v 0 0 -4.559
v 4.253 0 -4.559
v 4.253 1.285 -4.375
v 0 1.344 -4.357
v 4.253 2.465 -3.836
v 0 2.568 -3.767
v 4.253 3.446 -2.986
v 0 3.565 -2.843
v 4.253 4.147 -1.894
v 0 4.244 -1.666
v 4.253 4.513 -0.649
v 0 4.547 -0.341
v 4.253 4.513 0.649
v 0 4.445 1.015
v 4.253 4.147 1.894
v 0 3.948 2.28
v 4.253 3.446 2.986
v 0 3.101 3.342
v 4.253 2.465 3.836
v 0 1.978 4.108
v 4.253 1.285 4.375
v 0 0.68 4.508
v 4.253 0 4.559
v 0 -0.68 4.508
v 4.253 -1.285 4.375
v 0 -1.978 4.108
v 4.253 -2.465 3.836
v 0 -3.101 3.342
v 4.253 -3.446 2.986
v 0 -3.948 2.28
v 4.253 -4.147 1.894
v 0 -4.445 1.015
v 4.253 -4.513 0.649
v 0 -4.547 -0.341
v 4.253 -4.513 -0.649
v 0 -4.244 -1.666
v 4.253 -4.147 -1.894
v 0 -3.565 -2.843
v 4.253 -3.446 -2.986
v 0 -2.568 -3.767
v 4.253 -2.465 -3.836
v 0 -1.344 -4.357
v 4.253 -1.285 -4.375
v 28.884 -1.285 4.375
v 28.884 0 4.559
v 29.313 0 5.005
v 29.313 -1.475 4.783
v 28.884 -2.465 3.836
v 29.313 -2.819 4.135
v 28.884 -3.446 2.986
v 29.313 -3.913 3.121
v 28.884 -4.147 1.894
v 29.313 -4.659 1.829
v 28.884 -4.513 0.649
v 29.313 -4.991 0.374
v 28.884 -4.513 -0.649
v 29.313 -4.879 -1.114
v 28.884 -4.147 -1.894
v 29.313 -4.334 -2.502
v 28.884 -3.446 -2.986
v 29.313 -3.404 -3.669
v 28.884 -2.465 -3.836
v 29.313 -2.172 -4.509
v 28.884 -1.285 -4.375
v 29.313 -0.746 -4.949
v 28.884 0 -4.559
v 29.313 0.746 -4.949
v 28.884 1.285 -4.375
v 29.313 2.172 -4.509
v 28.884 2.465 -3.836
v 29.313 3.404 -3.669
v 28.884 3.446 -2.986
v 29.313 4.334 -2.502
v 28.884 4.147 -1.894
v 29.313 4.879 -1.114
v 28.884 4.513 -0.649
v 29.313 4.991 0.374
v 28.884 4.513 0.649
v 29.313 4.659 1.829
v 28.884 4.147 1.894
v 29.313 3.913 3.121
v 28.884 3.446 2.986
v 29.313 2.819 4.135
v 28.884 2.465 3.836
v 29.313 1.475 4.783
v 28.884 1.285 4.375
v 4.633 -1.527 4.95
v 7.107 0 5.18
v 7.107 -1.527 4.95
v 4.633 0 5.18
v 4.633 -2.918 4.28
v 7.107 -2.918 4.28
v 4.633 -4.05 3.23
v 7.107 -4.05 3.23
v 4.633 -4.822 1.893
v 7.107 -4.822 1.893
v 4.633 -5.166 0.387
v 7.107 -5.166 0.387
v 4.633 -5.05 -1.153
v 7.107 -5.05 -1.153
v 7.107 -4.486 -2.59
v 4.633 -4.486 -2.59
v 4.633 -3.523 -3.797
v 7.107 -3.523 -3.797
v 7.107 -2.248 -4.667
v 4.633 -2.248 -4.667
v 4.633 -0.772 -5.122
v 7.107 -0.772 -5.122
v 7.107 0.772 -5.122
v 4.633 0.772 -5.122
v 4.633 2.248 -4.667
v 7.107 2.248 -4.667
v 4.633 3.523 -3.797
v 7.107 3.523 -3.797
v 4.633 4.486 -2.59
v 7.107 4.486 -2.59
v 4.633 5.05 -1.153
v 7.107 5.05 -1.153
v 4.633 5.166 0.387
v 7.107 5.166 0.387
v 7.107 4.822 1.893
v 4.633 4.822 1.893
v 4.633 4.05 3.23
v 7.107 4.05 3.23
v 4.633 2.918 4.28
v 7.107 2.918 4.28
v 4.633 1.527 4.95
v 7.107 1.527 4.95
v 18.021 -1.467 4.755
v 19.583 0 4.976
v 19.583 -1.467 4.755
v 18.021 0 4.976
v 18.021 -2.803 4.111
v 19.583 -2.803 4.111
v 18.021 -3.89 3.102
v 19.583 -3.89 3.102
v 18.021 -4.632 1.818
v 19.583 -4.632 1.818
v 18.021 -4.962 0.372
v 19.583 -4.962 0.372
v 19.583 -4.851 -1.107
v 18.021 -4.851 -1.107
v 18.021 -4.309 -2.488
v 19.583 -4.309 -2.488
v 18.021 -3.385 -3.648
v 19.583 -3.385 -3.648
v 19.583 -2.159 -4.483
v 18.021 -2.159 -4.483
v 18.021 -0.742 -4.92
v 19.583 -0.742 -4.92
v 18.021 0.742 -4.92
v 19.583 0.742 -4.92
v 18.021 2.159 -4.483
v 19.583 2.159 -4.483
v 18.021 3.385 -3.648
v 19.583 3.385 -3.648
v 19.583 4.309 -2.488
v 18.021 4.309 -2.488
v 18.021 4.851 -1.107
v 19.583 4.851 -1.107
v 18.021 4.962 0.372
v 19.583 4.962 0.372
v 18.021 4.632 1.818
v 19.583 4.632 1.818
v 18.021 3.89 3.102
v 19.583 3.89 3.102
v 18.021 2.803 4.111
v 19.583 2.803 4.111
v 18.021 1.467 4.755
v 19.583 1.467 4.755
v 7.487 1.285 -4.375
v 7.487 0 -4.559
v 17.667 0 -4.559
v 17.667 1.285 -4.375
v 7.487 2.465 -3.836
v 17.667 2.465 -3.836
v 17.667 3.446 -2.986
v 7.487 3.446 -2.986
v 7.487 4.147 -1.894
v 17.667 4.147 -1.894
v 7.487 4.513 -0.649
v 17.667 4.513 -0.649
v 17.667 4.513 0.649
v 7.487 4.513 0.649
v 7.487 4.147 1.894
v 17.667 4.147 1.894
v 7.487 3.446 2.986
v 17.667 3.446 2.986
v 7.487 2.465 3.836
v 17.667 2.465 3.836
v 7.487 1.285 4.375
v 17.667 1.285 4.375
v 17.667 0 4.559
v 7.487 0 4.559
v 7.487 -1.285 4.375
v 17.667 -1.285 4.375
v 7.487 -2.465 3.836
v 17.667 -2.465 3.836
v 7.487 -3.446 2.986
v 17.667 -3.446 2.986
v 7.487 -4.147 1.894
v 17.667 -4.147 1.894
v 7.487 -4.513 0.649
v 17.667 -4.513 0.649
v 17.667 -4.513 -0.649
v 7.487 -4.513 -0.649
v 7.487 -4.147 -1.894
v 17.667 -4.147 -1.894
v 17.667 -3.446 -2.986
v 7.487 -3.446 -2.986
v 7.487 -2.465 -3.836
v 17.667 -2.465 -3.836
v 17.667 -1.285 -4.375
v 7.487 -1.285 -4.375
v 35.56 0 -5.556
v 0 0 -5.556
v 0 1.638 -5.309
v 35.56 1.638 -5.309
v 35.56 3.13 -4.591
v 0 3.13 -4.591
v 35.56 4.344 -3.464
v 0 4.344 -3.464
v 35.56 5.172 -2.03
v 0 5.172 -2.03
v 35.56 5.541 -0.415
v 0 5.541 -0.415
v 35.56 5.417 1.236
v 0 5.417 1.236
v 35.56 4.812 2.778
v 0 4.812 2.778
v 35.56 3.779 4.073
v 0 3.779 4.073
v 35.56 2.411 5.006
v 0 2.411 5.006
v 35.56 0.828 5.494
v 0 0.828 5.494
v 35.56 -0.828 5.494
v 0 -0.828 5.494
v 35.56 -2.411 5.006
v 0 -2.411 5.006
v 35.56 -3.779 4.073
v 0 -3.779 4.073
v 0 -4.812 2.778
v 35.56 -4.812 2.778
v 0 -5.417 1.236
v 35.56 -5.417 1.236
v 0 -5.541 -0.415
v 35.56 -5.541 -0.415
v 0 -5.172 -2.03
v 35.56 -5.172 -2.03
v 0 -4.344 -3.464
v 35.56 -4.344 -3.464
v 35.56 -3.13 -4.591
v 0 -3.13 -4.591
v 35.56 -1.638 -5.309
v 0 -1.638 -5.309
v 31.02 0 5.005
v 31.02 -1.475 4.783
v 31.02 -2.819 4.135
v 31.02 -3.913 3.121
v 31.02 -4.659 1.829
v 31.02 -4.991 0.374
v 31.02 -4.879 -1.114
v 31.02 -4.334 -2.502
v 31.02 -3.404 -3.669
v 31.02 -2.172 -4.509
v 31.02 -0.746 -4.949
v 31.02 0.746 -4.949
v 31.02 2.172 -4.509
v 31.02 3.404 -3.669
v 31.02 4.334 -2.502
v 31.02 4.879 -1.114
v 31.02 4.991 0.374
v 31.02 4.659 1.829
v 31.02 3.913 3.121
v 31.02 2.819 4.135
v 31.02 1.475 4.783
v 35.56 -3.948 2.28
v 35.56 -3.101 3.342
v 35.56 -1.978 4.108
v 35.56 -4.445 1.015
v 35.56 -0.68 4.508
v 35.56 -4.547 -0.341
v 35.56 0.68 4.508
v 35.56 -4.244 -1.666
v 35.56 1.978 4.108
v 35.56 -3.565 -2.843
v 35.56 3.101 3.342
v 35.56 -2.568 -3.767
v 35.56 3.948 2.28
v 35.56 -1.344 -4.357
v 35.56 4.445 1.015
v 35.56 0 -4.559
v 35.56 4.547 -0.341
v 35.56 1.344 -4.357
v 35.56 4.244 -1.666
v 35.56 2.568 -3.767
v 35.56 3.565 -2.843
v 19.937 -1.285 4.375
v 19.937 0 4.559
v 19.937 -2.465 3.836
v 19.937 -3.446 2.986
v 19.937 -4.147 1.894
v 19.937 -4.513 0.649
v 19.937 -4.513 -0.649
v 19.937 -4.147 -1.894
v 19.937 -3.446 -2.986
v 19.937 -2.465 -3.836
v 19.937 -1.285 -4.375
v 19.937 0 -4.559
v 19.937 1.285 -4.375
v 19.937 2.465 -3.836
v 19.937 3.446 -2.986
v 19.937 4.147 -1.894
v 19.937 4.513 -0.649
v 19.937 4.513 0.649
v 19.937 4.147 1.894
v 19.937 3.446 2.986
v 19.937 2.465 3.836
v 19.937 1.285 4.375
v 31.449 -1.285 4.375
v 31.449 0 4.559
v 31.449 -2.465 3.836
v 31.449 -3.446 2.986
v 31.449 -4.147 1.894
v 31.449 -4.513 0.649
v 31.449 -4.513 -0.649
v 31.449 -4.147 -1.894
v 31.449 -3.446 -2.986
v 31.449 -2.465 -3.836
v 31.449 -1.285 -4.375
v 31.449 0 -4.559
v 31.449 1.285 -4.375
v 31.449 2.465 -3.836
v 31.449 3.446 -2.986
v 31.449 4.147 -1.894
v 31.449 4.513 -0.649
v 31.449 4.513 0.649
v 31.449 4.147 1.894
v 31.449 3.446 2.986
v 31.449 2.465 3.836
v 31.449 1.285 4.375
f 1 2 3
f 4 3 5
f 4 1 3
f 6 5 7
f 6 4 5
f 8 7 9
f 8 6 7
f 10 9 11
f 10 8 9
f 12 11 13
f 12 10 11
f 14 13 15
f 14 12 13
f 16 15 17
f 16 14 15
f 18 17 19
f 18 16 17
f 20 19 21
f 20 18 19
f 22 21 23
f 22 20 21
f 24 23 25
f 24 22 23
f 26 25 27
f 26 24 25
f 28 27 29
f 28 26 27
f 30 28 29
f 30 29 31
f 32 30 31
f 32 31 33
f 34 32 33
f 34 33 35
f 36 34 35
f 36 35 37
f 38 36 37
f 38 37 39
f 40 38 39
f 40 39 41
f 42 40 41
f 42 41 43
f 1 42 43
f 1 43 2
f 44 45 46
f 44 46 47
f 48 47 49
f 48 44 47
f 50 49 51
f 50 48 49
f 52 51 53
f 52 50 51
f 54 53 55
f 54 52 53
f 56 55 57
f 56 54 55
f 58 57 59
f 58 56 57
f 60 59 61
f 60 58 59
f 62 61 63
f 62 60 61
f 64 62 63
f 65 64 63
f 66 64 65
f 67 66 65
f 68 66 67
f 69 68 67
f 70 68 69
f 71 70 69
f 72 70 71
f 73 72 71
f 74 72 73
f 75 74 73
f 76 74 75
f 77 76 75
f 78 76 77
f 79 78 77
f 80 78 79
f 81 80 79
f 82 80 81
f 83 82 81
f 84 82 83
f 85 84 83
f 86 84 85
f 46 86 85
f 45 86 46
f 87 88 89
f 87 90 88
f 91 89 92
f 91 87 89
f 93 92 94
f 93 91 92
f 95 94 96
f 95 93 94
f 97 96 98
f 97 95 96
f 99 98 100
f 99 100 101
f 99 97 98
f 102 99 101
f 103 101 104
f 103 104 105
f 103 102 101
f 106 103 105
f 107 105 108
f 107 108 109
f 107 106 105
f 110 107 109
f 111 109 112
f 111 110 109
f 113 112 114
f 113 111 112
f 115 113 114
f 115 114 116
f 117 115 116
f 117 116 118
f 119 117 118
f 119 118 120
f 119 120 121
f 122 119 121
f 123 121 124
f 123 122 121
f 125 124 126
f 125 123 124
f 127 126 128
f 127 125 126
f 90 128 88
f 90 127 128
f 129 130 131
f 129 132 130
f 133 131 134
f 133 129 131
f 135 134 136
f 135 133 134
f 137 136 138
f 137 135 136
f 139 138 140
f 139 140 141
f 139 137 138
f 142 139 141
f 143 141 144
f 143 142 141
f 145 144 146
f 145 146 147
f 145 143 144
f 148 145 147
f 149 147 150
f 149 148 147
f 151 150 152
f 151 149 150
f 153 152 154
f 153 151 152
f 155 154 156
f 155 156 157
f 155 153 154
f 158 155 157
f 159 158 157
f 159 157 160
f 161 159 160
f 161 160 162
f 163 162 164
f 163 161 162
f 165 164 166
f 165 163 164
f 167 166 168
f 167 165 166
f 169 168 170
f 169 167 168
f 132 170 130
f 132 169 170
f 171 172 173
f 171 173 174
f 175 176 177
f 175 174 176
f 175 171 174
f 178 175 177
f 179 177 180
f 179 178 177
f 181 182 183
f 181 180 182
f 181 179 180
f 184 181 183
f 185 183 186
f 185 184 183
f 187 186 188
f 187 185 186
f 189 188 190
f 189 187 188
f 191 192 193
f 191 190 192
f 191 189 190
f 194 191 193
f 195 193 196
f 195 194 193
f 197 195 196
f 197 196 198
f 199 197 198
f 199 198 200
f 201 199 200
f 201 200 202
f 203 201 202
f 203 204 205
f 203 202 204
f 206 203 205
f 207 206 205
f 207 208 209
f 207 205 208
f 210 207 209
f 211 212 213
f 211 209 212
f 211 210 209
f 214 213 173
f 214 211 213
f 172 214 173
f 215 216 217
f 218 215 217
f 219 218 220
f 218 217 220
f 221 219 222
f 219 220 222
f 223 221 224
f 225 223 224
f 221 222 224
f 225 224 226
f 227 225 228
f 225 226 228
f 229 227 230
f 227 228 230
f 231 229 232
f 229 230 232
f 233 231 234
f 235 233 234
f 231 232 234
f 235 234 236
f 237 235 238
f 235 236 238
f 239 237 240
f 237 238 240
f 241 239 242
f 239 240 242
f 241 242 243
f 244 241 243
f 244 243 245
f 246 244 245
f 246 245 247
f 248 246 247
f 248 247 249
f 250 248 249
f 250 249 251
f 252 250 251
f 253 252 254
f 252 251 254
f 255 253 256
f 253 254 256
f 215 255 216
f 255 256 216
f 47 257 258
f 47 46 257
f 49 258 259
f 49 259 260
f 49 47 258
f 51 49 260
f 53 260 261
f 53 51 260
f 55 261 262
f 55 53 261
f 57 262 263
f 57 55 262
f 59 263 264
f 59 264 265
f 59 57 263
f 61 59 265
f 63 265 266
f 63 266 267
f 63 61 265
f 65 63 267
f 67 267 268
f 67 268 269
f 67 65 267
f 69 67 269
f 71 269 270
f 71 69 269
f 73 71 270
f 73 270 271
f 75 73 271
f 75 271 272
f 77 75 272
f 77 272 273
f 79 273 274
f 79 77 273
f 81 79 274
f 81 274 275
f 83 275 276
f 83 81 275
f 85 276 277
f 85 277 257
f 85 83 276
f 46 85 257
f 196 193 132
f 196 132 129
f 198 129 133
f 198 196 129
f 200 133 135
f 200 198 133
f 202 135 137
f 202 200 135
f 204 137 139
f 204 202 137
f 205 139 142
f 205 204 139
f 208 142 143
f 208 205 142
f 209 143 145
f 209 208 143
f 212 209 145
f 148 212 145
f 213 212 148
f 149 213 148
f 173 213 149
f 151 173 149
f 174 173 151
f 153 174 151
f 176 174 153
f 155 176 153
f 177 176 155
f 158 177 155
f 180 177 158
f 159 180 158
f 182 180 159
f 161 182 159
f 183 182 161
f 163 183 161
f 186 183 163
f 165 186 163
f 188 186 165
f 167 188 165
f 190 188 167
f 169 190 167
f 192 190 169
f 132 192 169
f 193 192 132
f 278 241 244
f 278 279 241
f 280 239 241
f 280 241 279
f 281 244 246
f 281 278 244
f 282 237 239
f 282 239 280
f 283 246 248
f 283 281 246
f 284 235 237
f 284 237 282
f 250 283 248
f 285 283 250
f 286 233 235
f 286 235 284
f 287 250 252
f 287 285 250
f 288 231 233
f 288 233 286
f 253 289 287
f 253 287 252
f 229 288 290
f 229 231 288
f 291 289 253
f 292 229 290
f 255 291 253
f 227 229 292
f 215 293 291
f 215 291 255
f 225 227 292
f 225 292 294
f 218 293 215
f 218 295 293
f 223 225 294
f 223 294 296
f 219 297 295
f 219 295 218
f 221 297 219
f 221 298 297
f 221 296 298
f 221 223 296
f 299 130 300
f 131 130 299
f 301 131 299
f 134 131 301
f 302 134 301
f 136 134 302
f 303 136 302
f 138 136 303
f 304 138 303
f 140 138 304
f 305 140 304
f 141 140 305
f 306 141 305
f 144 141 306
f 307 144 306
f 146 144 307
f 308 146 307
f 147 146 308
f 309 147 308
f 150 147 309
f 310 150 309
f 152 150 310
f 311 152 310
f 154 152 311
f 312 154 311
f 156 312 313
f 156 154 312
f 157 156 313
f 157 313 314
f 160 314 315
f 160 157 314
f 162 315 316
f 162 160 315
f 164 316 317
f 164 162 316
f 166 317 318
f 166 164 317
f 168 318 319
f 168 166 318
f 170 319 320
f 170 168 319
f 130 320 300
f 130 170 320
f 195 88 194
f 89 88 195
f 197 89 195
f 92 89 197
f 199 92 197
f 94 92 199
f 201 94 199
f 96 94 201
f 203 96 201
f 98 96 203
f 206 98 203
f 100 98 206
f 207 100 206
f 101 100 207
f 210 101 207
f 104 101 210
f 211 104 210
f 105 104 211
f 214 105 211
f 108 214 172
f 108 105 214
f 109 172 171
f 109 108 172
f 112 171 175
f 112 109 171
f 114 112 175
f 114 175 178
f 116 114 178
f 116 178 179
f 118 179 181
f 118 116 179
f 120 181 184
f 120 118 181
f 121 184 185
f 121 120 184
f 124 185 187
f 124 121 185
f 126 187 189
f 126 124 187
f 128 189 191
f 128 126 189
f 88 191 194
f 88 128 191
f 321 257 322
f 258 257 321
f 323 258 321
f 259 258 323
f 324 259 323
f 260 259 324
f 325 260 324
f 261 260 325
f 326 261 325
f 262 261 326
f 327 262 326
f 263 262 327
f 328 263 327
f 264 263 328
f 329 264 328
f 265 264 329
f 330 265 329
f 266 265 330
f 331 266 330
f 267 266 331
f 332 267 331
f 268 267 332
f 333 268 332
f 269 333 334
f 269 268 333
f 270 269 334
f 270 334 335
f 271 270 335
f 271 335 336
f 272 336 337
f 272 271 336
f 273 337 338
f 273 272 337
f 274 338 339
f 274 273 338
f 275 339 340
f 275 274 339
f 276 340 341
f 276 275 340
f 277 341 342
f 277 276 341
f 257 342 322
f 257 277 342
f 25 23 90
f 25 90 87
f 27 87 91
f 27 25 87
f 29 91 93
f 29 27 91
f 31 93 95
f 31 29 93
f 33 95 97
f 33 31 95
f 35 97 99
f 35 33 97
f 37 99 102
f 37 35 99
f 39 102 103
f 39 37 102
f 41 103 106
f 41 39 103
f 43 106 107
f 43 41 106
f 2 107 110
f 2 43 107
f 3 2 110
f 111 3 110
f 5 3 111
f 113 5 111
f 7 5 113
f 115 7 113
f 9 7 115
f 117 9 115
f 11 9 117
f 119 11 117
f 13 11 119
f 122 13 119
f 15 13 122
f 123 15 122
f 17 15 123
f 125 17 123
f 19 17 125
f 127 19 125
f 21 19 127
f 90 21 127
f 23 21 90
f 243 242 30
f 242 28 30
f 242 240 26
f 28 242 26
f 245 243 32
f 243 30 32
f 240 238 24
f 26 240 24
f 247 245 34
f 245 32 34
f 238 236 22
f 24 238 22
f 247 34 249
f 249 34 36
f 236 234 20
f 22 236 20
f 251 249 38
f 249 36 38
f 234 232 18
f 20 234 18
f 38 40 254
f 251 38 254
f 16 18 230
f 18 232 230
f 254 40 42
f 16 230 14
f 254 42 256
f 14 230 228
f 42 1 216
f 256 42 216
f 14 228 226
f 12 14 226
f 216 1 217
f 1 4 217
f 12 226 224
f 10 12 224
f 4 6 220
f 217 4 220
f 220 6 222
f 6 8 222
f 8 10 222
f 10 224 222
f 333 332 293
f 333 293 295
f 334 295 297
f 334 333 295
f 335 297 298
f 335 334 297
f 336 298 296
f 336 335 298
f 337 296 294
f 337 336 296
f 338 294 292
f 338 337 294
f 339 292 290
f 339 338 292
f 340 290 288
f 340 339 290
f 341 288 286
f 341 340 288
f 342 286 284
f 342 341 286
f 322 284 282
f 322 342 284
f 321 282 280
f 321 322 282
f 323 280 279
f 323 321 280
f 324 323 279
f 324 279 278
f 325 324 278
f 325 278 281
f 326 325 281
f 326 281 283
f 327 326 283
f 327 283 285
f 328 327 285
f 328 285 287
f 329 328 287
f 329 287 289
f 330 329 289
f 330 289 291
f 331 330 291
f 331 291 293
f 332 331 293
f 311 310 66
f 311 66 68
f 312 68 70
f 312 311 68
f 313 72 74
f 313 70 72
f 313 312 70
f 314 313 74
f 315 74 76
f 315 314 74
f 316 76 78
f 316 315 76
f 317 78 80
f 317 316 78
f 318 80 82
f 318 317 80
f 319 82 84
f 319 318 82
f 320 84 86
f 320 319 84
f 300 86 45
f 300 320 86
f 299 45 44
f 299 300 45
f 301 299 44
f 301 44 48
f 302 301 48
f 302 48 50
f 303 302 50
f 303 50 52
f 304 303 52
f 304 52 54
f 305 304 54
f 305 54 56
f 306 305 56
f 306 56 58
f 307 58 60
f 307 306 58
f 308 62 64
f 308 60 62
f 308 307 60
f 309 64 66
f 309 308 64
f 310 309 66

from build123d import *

# Parameters (mm, degrees)
SKETCH1_R           = 5.55625
SKETCH1_R_2         = 4.5593
BOSS_EXTRUDE1_DEPTH = 35.56


with BuildPart() as part:
    # Sketch1 → Boss-Extrude1 (new body)
    with BuildSketch(Plane(origin=(0, 0, 0), x_dir=(0, 0, -1), z_dir=(1, 0, 0))):
        Circle(SKETCH1_R)
        Circle(SKETCH1_R_2, mode=Mode.SUBTRACT)
    extrude(amount=BOSS_EXTRUDE1_DEPTH)

    # Sketch2 → Cut-Revolve1 (revolve, cut)
    with BuildSketch(Plane.XY, mode=Mode.PRIVATE) as cut_revolve1_sk:
        Polygon((17.570232791, -4.445), (20.033534416, -4.445), (19.583193844, -4.976009125), (18.020573363, -4.976009125), align=None)
        Polygon((28.774465682, -4.445), (31.559150182, -4.445), (31.020477762, -5.004932574), (29.313138102, -5.004932574), align=None)
        Polygon((4.182688786, -4.445), (7.557077958, -4.445), (7.106737387, -5.18020875), (4.633029357, -5.18020875), align=None)
    revolve(cut_revolve1_sk.sketch.rotate(Axis((0, 0, 0), (1, 0, 0)), 270), axis=Axis((0, 0, 0), (1, 0, 0)), mode=Mode.SUBTRACT)


solid = part.part
